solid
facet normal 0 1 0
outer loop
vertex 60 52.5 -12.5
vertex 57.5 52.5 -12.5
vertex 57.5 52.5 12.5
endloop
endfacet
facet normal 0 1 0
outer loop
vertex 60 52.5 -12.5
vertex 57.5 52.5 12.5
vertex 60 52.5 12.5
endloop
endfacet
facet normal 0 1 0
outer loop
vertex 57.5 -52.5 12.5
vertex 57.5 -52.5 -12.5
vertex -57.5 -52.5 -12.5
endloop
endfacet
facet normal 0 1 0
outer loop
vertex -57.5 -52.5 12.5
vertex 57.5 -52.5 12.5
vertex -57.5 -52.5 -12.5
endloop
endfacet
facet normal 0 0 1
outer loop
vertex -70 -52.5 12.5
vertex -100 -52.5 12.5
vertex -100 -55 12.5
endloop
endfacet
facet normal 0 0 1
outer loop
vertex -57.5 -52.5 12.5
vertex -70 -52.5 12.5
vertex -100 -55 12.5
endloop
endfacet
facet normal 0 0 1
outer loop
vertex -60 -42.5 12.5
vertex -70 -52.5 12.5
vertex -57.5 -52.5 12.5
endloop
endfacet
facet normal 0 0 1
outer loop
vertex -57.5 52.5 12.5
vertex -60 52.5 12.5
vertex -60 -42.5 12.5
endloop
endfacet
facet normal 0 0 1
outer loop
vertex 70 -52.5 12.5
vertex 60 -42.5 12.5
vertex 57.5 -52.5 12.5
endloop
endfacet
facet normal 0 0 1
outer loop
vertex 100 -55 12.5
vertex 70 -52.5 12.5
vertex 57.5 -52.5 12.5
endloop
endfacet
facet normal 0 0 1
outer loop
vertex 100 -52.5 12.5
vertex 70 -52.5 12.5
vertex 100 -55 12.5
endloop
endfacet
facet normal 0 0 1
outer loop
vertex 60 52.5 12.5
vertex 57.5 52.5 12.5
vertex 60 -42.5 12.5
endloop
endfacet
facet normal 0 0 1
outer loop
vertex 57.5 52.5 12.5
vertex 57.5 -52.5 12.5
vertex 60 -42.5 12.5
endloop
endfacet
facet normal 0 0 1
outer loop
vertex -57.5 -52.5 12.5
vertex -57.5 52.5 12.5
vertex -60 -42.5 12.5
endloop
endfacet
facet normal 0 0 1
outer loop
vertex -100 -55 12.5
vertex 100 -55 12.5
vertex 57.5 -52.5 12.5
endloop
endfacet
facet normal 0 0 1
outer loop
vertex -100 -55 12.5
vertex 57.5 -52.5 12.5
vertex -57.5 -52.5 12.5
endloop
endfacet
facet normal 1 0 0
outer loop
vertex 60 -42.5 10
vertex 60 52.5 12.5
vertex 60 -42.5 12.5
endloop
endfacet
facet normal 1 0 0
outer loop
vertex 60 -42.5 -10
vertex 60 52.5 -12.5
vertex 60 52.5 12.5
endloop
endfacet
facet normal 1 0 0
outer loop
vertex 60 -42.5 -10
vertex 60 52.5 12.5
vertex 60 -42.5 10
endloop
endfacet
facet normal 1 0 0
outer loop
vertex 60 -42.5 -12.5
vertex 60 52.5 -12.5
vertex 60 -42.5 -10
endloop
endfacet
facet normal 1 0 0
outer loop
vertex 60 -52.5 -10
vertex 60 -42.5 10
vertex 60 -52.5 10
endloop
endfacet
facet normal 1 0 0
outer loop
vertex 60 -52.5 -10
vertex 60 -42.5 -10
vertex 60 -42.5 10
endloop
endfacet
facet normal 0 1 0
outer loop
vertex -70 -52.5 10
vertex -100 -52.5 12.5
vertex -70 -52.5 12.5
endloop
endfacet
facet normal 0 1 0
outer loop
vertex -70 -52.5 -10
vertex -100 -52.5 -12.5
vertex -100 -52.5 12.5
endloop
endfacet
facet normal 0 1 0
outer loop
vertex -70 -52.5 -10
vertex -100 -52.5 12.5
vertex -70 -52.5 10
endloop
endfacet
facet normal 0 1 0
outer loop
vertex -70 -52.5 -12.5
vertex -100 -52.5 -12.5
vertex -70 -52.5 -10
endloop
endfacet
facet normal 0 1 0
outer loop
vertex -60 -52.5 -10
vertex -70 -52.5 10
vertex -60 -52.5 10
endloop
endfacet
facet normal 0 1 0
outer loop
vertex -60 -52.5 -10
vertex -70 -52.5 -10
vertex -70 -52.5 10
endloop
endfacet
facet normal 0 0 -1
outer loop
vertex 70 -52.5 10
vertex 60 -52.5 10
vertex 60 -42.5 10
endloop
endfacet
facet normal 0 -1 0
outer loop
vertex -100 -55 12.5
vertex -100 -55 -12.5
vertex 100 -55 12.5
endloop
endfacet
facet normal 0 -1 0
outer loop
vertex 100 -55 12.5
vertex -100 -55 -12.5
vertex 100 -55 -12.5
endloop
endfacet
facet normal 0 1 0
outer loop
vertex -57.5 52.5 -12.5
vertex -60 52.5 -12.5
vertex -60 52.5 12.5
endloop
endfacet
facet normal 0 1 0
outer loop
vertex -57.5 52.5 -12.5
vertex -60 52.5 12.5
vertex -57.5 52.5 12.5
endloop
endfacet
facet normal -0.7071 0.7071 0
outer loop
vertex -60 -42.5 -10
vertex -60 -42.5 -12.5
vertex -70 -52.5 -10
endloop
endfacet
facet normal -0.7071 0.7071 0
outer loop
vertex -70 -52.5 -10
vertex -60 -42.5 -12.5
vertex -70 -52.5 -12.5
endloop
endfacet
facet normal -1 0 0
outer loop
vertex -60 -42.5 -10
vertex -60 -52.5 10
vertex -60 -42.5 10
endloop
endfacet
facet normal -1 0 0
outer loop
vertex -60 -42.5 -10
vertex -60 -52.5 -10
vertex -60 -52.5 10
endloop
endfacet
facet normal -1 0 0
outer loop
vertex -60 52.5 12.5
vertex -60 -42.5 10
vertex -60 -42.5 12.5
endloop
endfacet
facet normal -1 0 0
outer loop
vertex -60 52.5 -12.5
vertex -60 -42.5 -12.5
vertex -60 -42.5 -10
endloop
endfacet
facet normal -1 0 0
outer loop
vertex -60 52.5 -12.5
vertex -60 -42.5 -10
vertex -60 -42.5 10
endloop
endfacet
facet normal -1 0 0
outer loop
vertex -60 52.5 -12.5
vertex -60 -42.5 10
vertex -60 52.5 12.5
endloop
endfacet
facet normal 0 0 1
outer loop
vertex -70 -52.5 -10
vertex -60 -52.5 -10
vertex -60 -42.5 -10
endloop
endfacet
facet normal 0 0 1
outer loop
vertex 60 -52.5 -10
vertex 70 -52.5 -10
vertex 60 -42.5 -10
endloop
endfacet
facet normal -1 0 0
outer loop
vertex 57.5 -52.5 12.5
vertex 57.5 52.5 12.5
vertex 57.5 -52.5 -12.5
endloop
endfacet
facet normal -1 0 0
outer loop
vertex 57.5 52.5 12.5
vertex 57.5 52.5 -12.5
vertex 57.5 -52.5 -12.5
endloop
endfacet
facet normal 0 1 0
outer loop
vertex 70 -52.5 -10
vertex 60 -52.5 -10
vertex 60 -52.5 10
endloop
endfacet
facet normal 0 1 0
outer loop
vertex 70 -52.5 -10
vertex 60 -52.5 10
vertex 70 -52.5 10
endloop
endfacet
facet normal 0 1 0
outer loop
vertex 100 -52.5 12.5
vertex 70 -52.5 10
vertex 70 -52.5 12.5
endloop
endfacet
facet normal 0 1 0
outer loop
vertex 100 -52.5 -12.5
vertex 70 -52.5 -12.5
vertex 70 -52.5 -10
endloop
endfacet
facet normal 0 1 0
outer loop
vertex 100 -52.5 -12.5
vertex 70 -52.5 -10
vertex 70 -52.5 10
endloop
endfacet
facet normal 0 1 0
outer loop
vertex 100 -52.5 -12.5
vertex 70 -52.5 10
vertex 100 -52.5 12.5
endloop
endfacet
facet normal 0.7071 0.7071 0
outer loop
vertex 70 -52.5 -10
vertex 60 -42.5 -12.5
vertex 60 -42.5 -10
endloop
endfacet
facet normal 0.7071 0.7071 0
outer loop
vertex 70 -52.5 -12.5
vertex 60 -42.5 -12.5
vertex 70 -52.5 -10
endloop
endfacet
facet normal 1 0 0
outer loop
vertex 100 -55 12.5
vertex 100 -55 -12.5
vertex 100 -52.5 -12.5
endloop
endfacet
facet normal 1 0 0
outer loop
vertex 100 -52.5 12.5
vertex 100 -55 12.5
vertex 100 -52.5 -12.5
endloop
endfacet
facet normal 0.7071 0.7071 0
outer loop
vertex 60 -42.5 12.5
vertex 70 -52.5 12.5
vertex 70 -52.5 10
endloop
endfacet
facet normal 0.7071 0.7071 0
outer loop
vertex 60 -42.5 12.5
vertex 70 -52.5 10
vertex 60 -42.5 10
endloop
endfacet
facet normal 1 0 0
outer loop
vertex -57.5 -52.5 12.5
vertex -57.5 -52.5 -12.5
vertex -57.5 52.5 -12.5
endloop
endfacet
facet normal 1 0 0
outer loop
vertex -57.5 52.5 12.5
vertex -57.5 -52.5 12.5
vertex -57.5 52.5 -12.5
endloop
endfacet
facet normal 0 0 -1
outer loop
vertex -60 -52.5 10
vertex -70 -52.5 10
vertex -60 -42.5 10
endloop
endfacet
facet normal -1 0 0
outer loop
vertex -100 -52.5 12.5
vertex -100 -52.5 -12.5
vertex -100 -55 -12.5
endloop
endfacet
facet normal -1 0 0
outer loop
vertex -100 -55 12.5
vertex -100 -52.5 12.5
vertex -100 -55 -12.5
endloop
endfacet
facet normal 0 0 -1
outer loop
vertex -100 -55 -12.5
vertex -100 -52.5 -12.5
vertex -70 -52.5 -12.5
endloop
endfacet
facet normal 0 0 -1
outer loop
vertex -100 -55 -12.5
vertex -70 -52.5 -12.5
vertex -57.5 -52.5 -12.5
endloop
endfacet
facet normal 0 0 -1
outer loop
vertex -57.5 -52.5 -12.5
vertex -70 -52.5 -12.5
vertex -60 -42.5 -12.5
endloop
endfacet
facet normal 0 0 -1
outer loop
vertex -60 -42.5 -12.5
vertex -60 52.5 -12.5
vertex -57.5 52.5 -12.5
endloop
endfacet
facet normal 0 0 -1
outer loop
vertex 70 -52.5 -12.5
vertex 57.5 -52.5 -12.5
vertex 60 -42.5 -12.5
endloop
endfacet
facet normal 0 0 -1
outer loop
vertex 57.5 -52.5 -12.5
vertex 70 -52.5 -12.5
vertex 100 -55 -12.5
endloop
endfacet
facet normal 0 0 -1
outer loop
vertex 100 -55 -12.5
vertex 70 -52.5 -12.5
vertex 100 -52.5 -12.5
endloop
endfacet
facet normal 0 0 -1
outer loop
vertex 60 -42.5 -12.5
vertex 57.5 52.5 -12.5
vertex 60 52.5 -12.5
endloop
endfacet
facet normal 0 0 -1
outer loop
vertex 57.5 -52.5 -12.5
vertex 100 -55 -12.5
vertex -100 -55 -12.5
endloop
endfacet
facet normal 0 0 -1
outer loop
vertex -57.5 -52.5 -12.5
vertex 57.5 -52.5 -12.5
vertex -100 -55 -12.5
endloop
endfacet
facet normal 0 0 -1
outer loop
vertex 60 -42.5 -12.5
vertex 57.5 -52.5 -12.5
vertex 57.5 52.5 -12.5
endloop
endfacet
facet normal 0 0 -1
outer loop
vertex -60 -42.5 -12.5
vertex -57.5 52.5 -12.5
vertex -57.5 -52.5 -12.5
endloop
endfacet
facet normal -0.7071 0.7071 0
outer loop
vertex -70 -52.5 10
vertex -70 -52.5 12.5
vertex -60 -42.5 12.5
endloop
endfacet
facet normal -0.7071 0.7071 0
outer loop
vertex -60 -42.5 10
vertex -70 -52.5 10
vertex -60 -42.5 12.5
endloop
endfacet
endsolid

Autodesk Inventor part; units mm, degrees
ref_plane "YZ Plane" through (0, 0, 0) normal (1, 0, 0) x (0, 1, 0)
ref_plane "XZ Plane" through (0, 0, 0) normal (0, 1, 0) x (-1, 0, 0)
ref_plane "XY Plane" through (0, 0, 0) normal (0, 0, 1) x (1, 0, 0)
sketch "Sketch1" plane through (0, 0, 0) normal (0, 0, 1) x (1, 0, 0)
  line L0 (-60, 52.5) -> (60, 52.5)
  line L1 (60, 52.5) -> (60, -52.5)
  line L2 (60, -52.5) -> (-60, -52.5)
  line L3 (-60, -52.5) -> (-60, 52.5)
  line L4 (-60, 52.5) -> (60, -52.5) construction
  line L5 (60, 52.5) -> (-60, -52.5) construction
  circle A0 centre (0, 0) radius 52.5
  line L6 (-52.5, 0) -> (-60, 0)
  line L7 (52.5, 0) -> (60, 0)
  line L8 (-100, -55) -> (100, -55)
  line L9 (100, -55) -> (100, -50)
  line L10 (100, -50) -> (-100, -50)
  line L11 (-100, -50) -> (-100, -55)
  line L12 (-100, -55) -> (100, -50) construction
  line L13 (100, -55) -> (-100, -50) construction
  line L14 (-57.5, 52.5) -> (57.5, 52.5)
  line L15 (57.5, 52.5) -> (57.5, -52.5)
  line L16 (57.5, -52.5) -> (-57.5, -52.5)
  line L17 (-57.5, -52.5) -> (-57.5, 52.5)
  line L18 (-57.5, 52.5) -> (57.5, -52.5) construction
  line L19 (57.5, 52.5) -> (-57.5, -52.5) construction
  line L20 (-100, -52.5) -> (100, -52.5)
  point P0 (0, -52.5)
  point P1 (-60, -50)
  point P2 (60, -50)
  point P3 (60, -52.5)
  point P4 (57.5, 52.5)
  point P5 (57.5, -52.5)
  point P6 (-57.5, 52.5)
  point P7 (-60, -52.5)
  dimension "d0" = 120
  dimension "d1" = 105
  dimension "d2" = 105
  dimension "d5" = 200
  dimension "d6" = 5
  dimension "d30" = 115
  dimension "d31" = 105
extrude "Extrusion1" add sketch "Sketch1" along normal mid plane 25 contours L0 L17 L6 L3 | L6 L17 L10 L3 | L10 L17 L2 L3 | L0 L1 L7 L15 | L2 L20 L9 L8 L11 | L7 L1 L10 L15 | L10 L1 L2 L15
sketch "Sketch6" plane through (0, 0, 12.5) normal (0, 0, 1) x (1, 0, 0)
  line L0 (-60, -52.5) -> (-60, -42.5)
  line L1 (-60, 52.5) -> (-60, -52.5) projected
  line L2 (-60, -52.5) -> (-70, -52.5)
  line L3 (-60, -52.5) -> (-100, -52.5) projected
  line L4 (-70, -52.5) -> (-60, -42.5)
  line L5 (0, -52.5) -> (0, -39.6875)
  line L6 (60, -52.5) -> (60, -42.5)
  line L7 (60, -52.5) -> (70, -52.5)
  line L8 (70, -52.5) -> (60, -42.5)
  point P0 (0, 0)
  dimension "d32" = 10
  dimension "d33" = 10
extrude "Extrusion5" add sketch "Sketch6" against normal blind 2.5
mirror "Mirror1" about plane through (0, 0, 0) normal (0, 0, 1) of "Extrusion5"
properties part number "SOPORTE DE GUIA"
